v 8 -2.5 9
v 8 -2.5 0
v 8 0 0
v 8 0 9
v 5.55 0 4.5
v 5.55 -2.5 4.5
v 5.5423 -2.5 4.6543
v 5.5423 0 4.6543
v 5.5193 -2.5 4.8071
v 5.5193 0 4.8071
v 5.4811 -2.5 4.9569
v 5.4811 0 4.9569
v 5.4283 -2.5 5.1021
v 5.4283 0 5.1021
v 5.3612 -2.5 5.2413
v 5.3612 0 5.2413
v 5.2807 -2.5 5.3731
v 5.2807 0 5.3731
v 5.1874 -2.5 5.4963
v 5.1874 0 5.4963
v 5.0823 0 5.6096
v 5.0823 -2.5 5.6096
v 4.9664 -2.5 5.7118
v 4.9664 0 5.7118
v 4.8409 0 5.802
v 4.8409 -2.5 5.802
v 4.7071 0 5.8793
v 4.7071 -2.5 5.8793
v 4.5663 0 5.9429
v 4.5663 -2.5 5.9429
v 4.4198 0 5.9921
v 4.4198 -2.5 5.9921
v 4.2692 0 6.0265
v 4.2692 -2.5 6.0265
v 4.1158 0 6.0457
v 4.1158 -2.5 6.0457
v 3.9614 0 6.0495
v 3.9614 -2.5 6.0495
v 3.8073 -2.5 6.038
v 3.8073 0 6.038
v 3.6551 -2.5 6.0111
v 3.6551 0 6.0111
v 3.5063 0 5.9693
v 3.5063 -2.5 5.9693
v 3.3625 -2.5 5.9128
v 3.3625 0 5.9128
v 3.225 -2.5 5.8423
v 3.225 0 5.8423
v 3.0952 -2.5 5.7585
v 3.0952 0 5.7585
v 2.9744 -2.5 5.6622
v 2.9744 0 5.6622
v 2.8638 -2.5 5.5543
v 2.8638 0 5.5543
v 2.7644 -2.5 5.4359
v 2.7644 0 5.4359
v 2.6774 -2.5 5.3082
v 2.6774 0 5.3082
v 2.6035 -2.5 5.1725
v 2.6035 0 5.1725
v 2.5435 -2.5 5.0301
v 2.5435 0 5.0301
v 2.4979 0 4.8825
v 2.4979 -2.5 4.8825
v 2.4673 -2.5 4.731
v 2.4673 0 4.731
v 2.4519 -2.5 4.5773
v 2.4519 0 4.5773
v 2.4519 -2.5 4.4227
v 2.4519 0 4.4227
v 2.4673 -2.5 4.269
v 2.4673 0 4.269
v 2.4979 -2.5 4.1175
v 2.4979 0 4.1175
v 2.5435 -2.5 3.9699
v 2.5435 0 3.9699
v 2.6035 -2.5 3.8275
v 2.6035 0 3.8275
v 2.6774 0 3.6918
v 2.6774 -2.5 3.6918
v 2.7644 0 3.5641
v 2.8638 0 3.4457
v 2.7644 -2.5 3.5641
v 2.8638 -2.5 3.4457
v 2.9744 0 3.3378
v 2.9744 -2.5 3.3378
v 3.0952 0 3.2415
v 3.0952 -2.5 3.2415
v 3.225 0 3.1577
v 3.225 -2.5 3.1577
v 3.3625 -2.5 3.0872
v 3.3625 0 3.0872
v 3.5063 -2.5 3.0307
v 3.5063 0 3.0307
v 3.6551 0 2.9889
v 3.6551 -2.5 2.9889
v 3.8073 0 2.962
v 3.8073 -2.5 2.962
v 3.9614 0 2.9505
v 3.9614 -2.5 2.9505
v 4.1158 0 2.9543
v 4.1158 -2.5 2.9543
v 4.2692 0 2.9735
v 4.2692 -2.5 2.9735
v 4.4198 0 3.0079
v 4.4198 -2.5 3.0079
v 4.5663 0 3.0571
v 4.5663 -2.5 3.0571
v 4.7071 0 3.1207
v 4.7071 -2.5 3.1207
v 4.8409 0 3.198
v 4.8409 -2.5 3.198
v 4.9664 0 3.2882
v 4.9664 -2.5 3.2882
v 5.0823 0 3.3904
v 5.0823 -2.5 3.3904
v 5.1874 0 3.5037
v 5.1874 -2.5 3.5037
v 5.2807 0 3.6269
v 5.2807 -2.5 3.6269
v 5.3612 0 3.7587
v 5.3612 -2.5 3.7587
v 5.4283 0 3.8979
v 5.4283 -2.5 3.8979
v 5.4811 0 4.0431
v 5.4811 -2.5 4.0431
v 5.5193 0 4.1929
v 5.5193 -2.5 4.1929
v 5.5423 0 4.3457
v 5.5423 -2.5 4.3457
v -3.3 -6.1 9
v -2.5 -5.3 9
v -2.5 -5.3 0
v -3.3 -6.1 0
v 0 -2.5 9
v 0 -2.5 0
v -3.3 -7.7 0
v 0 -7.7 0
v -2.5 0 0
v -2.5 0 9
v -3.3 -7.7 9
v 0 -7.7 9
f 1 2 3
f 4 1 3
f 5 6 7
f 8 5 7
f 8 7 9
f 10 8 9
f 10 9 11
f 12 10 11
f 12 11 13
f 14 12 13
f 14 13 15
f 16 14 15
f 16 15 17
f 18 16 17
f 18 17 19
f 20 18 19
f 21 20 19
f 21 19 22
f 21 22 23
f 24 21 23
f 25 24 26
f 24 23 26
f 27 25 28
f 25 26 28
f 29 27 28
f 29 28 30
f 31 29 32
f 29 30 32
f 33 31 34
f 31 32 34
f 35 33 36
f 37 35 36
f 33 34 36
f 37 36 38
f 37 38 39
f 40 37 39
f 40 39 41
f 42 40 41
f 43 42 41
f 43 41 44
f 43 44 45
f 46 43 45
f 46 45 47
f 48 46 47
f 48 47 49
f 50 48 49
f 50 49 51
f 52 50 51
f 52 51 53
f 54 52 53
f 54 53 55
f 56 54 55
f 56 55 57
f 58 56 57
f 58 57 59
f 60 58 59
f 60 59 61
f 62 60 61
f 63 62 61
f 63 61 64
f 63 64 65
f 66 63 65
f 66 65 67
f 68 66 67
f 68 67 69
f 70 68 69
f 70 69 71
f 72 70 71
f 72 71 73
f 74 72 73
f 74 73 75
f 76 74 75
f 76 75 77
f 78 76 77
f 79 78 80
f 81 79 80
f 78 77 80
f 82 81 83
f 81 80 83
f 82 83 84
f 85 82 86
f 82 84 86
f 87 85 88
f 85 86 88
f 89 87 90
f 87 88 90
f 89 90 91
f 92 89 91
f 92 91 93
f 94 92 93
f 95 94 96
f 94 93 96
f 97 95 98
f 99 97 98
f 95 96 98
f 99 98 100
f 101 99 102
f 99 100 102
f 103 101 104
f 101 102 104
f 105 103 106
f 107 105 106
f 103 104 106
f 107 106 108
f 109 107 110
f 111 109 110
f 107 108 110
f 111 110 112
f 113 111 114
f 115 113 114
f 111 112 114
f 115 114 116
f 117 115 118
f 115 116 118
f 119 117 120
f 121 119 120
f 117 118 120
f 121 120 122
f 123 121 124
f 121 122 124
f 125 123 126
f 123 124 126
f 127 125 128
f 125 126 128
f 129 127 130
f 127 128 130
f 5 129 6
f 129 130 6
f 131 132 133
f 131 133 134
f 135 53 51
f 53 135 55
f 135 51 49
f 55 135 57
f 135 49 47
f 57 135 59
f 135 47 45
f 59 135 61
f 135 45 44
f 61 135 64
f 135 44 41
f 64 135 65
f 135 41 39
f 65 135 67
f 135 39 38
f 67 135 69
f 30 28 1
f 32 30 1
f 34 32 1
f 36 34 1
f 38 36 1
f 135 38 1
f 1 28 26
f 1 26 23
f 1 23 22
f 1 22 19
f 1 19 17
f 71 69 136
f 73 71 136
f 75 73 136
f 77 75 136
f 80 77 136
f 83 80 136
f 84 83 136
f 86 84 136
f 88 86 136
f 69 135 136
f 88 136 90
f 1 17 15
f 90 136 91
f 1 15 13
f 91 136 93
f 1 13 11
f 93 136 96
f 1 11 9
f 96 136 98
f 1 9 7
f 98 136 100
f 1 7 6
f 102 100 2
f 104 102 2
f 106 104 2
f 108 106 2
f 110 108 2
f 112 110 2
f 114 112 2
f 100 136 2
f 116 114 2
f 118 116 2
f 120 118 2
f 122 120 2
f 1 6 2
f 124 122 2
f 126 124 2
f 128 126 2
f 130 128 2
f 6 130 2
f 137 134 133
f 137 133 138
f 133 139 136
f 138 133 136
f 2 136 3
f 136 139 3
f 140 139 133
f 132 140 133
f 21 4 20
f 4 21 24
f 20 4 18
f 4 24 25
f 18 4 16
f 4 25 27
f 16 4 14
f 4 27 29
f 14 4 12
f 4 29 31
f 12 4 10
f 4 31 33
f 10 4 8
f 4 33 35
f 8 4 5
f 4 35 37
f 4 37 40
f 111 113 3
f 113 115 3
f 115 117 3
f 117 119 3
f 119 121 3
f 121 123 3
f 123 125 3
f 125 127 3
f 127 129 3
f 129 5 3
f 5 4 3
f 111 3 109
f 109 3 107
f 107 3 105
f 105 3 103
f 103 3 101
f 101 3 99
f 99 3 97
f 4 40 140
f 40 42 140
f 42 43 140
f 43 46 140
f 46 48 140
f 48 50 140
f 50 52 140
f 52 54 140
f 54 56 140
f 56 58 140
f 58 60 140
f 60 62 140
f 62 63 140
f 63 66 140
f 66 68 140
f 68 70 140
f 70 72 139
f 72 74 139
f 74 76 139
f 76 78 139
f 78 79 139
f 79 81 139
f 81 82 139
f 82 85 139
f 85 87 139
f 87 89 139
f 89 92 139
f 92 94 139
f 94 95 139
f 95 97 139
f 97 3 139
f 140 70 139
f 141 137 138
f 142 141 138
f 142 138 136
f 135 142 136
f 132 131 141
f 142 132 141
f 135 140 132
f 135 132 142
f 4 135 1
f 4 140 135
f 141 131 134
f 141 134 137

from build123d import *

# Parameters (mm, degrees)
SKETCH1_W           = 8
SKETCH1_H           = 2.5
BOSS_EXTRUDE1_DEPTH = 9
SKETCH2_R           = 1.55
CUT_EXTRUDE1_DEPTH  = 3.5


with BuildPart() as part:
    # Sketch1 → Boss-Extrude1 (new body)
    with BuildSketch(Plane.XY):
        with Locations((4, -1.25)):
            Rectangle(SKETCH1_W, SKETCH1_H)
        Polygon((0, -7.7), (0, 0), (-2.5, 0), (-2.5, -5.3), (-3.3, -6.1), (-3.3, -7.7), align=None)
    extrude(amount=BOSS_EXTRUDE1_DEPTH)

    # Sketch2 → Cut-Extrude1 (cut, through all)
    with BuildSketch(Plane.XZ.offset(2.5)):
        with Locations((4, 4.5)):
            Circle(SKETCH2_R)
    extrude(amount=-CUT_EXTRUDE1_DEPTH, mode=Mode.SUBTRACT)


solid = part.part
